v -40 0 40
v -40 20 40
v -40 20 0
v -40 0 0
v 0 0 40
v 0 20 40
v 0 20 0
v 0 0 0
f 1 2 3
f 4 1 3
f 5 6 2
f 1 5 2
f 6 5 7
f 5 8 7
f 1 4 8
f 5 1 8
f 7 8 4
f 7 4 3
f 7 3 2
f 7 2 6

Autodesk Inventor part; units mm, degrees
ref_plane "YZ Plane" through (0, 0, 0) normal (1, 0, 0) x (0, 1, 0)
ref_plane "XZ Plane" through (0, 0, 0) normal (0, 1, 0) x (-1, 0, 0)
ref_plane "XY Plane" through (0, 0, 0) normal (0, 0, 1) x (1, 0, 0)
sketch "Sketch1" plane through (0, 0, 0) normal (0, 1, 0) x (-1, 0, 0)
  line L0 (0, 0) -> (30, 0)
  line L1 (30, 0) -> (30, 30)
  line L2 (30, 30) -> (0, 30)
  line L3 (0, 30) -> (0, 0)
  dimension "d0" = 30
  dimension "d1" = 30
extrude "Extrusion1" add sketch "Sketch1" along normal blind 15
sketch "Sketch2" plane through (0, 15, 0) normal (0, 1, 0) x (1, 0, 0)
  line L0 (-30, 0) -> (-30, -30) projected
  line L1 (-30, -30) -> (0, -30) projected
  line L2 (-30, 0) -> (0, 0)
  line L3 (0, 0) -> (0, -30)
  line L4 (0, -30) -> (-30, -30)
  line L5 (-30, -30) -> (-30, 0)
extrude "Extrusion2" add sketch "Sketch2" along normal blind 5
sketch "Sketch3" plane through (-30, 0, 30) normal (0, 0, 1) x (1, 0, 0)
  line L0 (30, 0) -> (30, 20) projected
  line L1 (0, 0) -> (30, 0)
  line L2 (30, 0) -> (30, 20)
  line L3 (30, 20) -> (0, 20)
  line L4 (0, 20) -> (0, 0)
extrude "Extrusion3" add sketch "Sketch3" along normal blind 10
sketch "Sketch4" plane through (-30, 0, 0) normal (-1, 0, 0) x (0, 0, 1)
  line L0 (0, 0) -> (0, 20) projected
  line L1 (0, 0) -> (39.8587, 0)
  line L2 (39.8587, 0) -> (39.8587, 20)
  line L3 (39.8587, 20) -> (0, 20)
  line L4 (0, 20) -> (0, 0)
extrude "Extrusion4" add sketch "Sketch4" along normal blind 10
sketch "Sketch5" plane through (0, 20, 0) normal (0, 1, 0) x (1, 0, 0)
  line L0 (-30, -39.8587) -> (-40, -39.8587) projected
  line L1 (-30, -40) -> (0, -40) projected
  line L2 (-40, -39.8587) -> (-30, -39.8587)
  line L3 (-30, -39.8587) -> (-30, -40)
  line L4 (-30, -40) -> (-40, -40)
  line L5 (-40, -40) -> (-40, -39.8587)
  point P0 (0, 0)
extrude "Extrusion5" add sketch "Sketch5" against normal blind 20
properties part number "Servosmall"
